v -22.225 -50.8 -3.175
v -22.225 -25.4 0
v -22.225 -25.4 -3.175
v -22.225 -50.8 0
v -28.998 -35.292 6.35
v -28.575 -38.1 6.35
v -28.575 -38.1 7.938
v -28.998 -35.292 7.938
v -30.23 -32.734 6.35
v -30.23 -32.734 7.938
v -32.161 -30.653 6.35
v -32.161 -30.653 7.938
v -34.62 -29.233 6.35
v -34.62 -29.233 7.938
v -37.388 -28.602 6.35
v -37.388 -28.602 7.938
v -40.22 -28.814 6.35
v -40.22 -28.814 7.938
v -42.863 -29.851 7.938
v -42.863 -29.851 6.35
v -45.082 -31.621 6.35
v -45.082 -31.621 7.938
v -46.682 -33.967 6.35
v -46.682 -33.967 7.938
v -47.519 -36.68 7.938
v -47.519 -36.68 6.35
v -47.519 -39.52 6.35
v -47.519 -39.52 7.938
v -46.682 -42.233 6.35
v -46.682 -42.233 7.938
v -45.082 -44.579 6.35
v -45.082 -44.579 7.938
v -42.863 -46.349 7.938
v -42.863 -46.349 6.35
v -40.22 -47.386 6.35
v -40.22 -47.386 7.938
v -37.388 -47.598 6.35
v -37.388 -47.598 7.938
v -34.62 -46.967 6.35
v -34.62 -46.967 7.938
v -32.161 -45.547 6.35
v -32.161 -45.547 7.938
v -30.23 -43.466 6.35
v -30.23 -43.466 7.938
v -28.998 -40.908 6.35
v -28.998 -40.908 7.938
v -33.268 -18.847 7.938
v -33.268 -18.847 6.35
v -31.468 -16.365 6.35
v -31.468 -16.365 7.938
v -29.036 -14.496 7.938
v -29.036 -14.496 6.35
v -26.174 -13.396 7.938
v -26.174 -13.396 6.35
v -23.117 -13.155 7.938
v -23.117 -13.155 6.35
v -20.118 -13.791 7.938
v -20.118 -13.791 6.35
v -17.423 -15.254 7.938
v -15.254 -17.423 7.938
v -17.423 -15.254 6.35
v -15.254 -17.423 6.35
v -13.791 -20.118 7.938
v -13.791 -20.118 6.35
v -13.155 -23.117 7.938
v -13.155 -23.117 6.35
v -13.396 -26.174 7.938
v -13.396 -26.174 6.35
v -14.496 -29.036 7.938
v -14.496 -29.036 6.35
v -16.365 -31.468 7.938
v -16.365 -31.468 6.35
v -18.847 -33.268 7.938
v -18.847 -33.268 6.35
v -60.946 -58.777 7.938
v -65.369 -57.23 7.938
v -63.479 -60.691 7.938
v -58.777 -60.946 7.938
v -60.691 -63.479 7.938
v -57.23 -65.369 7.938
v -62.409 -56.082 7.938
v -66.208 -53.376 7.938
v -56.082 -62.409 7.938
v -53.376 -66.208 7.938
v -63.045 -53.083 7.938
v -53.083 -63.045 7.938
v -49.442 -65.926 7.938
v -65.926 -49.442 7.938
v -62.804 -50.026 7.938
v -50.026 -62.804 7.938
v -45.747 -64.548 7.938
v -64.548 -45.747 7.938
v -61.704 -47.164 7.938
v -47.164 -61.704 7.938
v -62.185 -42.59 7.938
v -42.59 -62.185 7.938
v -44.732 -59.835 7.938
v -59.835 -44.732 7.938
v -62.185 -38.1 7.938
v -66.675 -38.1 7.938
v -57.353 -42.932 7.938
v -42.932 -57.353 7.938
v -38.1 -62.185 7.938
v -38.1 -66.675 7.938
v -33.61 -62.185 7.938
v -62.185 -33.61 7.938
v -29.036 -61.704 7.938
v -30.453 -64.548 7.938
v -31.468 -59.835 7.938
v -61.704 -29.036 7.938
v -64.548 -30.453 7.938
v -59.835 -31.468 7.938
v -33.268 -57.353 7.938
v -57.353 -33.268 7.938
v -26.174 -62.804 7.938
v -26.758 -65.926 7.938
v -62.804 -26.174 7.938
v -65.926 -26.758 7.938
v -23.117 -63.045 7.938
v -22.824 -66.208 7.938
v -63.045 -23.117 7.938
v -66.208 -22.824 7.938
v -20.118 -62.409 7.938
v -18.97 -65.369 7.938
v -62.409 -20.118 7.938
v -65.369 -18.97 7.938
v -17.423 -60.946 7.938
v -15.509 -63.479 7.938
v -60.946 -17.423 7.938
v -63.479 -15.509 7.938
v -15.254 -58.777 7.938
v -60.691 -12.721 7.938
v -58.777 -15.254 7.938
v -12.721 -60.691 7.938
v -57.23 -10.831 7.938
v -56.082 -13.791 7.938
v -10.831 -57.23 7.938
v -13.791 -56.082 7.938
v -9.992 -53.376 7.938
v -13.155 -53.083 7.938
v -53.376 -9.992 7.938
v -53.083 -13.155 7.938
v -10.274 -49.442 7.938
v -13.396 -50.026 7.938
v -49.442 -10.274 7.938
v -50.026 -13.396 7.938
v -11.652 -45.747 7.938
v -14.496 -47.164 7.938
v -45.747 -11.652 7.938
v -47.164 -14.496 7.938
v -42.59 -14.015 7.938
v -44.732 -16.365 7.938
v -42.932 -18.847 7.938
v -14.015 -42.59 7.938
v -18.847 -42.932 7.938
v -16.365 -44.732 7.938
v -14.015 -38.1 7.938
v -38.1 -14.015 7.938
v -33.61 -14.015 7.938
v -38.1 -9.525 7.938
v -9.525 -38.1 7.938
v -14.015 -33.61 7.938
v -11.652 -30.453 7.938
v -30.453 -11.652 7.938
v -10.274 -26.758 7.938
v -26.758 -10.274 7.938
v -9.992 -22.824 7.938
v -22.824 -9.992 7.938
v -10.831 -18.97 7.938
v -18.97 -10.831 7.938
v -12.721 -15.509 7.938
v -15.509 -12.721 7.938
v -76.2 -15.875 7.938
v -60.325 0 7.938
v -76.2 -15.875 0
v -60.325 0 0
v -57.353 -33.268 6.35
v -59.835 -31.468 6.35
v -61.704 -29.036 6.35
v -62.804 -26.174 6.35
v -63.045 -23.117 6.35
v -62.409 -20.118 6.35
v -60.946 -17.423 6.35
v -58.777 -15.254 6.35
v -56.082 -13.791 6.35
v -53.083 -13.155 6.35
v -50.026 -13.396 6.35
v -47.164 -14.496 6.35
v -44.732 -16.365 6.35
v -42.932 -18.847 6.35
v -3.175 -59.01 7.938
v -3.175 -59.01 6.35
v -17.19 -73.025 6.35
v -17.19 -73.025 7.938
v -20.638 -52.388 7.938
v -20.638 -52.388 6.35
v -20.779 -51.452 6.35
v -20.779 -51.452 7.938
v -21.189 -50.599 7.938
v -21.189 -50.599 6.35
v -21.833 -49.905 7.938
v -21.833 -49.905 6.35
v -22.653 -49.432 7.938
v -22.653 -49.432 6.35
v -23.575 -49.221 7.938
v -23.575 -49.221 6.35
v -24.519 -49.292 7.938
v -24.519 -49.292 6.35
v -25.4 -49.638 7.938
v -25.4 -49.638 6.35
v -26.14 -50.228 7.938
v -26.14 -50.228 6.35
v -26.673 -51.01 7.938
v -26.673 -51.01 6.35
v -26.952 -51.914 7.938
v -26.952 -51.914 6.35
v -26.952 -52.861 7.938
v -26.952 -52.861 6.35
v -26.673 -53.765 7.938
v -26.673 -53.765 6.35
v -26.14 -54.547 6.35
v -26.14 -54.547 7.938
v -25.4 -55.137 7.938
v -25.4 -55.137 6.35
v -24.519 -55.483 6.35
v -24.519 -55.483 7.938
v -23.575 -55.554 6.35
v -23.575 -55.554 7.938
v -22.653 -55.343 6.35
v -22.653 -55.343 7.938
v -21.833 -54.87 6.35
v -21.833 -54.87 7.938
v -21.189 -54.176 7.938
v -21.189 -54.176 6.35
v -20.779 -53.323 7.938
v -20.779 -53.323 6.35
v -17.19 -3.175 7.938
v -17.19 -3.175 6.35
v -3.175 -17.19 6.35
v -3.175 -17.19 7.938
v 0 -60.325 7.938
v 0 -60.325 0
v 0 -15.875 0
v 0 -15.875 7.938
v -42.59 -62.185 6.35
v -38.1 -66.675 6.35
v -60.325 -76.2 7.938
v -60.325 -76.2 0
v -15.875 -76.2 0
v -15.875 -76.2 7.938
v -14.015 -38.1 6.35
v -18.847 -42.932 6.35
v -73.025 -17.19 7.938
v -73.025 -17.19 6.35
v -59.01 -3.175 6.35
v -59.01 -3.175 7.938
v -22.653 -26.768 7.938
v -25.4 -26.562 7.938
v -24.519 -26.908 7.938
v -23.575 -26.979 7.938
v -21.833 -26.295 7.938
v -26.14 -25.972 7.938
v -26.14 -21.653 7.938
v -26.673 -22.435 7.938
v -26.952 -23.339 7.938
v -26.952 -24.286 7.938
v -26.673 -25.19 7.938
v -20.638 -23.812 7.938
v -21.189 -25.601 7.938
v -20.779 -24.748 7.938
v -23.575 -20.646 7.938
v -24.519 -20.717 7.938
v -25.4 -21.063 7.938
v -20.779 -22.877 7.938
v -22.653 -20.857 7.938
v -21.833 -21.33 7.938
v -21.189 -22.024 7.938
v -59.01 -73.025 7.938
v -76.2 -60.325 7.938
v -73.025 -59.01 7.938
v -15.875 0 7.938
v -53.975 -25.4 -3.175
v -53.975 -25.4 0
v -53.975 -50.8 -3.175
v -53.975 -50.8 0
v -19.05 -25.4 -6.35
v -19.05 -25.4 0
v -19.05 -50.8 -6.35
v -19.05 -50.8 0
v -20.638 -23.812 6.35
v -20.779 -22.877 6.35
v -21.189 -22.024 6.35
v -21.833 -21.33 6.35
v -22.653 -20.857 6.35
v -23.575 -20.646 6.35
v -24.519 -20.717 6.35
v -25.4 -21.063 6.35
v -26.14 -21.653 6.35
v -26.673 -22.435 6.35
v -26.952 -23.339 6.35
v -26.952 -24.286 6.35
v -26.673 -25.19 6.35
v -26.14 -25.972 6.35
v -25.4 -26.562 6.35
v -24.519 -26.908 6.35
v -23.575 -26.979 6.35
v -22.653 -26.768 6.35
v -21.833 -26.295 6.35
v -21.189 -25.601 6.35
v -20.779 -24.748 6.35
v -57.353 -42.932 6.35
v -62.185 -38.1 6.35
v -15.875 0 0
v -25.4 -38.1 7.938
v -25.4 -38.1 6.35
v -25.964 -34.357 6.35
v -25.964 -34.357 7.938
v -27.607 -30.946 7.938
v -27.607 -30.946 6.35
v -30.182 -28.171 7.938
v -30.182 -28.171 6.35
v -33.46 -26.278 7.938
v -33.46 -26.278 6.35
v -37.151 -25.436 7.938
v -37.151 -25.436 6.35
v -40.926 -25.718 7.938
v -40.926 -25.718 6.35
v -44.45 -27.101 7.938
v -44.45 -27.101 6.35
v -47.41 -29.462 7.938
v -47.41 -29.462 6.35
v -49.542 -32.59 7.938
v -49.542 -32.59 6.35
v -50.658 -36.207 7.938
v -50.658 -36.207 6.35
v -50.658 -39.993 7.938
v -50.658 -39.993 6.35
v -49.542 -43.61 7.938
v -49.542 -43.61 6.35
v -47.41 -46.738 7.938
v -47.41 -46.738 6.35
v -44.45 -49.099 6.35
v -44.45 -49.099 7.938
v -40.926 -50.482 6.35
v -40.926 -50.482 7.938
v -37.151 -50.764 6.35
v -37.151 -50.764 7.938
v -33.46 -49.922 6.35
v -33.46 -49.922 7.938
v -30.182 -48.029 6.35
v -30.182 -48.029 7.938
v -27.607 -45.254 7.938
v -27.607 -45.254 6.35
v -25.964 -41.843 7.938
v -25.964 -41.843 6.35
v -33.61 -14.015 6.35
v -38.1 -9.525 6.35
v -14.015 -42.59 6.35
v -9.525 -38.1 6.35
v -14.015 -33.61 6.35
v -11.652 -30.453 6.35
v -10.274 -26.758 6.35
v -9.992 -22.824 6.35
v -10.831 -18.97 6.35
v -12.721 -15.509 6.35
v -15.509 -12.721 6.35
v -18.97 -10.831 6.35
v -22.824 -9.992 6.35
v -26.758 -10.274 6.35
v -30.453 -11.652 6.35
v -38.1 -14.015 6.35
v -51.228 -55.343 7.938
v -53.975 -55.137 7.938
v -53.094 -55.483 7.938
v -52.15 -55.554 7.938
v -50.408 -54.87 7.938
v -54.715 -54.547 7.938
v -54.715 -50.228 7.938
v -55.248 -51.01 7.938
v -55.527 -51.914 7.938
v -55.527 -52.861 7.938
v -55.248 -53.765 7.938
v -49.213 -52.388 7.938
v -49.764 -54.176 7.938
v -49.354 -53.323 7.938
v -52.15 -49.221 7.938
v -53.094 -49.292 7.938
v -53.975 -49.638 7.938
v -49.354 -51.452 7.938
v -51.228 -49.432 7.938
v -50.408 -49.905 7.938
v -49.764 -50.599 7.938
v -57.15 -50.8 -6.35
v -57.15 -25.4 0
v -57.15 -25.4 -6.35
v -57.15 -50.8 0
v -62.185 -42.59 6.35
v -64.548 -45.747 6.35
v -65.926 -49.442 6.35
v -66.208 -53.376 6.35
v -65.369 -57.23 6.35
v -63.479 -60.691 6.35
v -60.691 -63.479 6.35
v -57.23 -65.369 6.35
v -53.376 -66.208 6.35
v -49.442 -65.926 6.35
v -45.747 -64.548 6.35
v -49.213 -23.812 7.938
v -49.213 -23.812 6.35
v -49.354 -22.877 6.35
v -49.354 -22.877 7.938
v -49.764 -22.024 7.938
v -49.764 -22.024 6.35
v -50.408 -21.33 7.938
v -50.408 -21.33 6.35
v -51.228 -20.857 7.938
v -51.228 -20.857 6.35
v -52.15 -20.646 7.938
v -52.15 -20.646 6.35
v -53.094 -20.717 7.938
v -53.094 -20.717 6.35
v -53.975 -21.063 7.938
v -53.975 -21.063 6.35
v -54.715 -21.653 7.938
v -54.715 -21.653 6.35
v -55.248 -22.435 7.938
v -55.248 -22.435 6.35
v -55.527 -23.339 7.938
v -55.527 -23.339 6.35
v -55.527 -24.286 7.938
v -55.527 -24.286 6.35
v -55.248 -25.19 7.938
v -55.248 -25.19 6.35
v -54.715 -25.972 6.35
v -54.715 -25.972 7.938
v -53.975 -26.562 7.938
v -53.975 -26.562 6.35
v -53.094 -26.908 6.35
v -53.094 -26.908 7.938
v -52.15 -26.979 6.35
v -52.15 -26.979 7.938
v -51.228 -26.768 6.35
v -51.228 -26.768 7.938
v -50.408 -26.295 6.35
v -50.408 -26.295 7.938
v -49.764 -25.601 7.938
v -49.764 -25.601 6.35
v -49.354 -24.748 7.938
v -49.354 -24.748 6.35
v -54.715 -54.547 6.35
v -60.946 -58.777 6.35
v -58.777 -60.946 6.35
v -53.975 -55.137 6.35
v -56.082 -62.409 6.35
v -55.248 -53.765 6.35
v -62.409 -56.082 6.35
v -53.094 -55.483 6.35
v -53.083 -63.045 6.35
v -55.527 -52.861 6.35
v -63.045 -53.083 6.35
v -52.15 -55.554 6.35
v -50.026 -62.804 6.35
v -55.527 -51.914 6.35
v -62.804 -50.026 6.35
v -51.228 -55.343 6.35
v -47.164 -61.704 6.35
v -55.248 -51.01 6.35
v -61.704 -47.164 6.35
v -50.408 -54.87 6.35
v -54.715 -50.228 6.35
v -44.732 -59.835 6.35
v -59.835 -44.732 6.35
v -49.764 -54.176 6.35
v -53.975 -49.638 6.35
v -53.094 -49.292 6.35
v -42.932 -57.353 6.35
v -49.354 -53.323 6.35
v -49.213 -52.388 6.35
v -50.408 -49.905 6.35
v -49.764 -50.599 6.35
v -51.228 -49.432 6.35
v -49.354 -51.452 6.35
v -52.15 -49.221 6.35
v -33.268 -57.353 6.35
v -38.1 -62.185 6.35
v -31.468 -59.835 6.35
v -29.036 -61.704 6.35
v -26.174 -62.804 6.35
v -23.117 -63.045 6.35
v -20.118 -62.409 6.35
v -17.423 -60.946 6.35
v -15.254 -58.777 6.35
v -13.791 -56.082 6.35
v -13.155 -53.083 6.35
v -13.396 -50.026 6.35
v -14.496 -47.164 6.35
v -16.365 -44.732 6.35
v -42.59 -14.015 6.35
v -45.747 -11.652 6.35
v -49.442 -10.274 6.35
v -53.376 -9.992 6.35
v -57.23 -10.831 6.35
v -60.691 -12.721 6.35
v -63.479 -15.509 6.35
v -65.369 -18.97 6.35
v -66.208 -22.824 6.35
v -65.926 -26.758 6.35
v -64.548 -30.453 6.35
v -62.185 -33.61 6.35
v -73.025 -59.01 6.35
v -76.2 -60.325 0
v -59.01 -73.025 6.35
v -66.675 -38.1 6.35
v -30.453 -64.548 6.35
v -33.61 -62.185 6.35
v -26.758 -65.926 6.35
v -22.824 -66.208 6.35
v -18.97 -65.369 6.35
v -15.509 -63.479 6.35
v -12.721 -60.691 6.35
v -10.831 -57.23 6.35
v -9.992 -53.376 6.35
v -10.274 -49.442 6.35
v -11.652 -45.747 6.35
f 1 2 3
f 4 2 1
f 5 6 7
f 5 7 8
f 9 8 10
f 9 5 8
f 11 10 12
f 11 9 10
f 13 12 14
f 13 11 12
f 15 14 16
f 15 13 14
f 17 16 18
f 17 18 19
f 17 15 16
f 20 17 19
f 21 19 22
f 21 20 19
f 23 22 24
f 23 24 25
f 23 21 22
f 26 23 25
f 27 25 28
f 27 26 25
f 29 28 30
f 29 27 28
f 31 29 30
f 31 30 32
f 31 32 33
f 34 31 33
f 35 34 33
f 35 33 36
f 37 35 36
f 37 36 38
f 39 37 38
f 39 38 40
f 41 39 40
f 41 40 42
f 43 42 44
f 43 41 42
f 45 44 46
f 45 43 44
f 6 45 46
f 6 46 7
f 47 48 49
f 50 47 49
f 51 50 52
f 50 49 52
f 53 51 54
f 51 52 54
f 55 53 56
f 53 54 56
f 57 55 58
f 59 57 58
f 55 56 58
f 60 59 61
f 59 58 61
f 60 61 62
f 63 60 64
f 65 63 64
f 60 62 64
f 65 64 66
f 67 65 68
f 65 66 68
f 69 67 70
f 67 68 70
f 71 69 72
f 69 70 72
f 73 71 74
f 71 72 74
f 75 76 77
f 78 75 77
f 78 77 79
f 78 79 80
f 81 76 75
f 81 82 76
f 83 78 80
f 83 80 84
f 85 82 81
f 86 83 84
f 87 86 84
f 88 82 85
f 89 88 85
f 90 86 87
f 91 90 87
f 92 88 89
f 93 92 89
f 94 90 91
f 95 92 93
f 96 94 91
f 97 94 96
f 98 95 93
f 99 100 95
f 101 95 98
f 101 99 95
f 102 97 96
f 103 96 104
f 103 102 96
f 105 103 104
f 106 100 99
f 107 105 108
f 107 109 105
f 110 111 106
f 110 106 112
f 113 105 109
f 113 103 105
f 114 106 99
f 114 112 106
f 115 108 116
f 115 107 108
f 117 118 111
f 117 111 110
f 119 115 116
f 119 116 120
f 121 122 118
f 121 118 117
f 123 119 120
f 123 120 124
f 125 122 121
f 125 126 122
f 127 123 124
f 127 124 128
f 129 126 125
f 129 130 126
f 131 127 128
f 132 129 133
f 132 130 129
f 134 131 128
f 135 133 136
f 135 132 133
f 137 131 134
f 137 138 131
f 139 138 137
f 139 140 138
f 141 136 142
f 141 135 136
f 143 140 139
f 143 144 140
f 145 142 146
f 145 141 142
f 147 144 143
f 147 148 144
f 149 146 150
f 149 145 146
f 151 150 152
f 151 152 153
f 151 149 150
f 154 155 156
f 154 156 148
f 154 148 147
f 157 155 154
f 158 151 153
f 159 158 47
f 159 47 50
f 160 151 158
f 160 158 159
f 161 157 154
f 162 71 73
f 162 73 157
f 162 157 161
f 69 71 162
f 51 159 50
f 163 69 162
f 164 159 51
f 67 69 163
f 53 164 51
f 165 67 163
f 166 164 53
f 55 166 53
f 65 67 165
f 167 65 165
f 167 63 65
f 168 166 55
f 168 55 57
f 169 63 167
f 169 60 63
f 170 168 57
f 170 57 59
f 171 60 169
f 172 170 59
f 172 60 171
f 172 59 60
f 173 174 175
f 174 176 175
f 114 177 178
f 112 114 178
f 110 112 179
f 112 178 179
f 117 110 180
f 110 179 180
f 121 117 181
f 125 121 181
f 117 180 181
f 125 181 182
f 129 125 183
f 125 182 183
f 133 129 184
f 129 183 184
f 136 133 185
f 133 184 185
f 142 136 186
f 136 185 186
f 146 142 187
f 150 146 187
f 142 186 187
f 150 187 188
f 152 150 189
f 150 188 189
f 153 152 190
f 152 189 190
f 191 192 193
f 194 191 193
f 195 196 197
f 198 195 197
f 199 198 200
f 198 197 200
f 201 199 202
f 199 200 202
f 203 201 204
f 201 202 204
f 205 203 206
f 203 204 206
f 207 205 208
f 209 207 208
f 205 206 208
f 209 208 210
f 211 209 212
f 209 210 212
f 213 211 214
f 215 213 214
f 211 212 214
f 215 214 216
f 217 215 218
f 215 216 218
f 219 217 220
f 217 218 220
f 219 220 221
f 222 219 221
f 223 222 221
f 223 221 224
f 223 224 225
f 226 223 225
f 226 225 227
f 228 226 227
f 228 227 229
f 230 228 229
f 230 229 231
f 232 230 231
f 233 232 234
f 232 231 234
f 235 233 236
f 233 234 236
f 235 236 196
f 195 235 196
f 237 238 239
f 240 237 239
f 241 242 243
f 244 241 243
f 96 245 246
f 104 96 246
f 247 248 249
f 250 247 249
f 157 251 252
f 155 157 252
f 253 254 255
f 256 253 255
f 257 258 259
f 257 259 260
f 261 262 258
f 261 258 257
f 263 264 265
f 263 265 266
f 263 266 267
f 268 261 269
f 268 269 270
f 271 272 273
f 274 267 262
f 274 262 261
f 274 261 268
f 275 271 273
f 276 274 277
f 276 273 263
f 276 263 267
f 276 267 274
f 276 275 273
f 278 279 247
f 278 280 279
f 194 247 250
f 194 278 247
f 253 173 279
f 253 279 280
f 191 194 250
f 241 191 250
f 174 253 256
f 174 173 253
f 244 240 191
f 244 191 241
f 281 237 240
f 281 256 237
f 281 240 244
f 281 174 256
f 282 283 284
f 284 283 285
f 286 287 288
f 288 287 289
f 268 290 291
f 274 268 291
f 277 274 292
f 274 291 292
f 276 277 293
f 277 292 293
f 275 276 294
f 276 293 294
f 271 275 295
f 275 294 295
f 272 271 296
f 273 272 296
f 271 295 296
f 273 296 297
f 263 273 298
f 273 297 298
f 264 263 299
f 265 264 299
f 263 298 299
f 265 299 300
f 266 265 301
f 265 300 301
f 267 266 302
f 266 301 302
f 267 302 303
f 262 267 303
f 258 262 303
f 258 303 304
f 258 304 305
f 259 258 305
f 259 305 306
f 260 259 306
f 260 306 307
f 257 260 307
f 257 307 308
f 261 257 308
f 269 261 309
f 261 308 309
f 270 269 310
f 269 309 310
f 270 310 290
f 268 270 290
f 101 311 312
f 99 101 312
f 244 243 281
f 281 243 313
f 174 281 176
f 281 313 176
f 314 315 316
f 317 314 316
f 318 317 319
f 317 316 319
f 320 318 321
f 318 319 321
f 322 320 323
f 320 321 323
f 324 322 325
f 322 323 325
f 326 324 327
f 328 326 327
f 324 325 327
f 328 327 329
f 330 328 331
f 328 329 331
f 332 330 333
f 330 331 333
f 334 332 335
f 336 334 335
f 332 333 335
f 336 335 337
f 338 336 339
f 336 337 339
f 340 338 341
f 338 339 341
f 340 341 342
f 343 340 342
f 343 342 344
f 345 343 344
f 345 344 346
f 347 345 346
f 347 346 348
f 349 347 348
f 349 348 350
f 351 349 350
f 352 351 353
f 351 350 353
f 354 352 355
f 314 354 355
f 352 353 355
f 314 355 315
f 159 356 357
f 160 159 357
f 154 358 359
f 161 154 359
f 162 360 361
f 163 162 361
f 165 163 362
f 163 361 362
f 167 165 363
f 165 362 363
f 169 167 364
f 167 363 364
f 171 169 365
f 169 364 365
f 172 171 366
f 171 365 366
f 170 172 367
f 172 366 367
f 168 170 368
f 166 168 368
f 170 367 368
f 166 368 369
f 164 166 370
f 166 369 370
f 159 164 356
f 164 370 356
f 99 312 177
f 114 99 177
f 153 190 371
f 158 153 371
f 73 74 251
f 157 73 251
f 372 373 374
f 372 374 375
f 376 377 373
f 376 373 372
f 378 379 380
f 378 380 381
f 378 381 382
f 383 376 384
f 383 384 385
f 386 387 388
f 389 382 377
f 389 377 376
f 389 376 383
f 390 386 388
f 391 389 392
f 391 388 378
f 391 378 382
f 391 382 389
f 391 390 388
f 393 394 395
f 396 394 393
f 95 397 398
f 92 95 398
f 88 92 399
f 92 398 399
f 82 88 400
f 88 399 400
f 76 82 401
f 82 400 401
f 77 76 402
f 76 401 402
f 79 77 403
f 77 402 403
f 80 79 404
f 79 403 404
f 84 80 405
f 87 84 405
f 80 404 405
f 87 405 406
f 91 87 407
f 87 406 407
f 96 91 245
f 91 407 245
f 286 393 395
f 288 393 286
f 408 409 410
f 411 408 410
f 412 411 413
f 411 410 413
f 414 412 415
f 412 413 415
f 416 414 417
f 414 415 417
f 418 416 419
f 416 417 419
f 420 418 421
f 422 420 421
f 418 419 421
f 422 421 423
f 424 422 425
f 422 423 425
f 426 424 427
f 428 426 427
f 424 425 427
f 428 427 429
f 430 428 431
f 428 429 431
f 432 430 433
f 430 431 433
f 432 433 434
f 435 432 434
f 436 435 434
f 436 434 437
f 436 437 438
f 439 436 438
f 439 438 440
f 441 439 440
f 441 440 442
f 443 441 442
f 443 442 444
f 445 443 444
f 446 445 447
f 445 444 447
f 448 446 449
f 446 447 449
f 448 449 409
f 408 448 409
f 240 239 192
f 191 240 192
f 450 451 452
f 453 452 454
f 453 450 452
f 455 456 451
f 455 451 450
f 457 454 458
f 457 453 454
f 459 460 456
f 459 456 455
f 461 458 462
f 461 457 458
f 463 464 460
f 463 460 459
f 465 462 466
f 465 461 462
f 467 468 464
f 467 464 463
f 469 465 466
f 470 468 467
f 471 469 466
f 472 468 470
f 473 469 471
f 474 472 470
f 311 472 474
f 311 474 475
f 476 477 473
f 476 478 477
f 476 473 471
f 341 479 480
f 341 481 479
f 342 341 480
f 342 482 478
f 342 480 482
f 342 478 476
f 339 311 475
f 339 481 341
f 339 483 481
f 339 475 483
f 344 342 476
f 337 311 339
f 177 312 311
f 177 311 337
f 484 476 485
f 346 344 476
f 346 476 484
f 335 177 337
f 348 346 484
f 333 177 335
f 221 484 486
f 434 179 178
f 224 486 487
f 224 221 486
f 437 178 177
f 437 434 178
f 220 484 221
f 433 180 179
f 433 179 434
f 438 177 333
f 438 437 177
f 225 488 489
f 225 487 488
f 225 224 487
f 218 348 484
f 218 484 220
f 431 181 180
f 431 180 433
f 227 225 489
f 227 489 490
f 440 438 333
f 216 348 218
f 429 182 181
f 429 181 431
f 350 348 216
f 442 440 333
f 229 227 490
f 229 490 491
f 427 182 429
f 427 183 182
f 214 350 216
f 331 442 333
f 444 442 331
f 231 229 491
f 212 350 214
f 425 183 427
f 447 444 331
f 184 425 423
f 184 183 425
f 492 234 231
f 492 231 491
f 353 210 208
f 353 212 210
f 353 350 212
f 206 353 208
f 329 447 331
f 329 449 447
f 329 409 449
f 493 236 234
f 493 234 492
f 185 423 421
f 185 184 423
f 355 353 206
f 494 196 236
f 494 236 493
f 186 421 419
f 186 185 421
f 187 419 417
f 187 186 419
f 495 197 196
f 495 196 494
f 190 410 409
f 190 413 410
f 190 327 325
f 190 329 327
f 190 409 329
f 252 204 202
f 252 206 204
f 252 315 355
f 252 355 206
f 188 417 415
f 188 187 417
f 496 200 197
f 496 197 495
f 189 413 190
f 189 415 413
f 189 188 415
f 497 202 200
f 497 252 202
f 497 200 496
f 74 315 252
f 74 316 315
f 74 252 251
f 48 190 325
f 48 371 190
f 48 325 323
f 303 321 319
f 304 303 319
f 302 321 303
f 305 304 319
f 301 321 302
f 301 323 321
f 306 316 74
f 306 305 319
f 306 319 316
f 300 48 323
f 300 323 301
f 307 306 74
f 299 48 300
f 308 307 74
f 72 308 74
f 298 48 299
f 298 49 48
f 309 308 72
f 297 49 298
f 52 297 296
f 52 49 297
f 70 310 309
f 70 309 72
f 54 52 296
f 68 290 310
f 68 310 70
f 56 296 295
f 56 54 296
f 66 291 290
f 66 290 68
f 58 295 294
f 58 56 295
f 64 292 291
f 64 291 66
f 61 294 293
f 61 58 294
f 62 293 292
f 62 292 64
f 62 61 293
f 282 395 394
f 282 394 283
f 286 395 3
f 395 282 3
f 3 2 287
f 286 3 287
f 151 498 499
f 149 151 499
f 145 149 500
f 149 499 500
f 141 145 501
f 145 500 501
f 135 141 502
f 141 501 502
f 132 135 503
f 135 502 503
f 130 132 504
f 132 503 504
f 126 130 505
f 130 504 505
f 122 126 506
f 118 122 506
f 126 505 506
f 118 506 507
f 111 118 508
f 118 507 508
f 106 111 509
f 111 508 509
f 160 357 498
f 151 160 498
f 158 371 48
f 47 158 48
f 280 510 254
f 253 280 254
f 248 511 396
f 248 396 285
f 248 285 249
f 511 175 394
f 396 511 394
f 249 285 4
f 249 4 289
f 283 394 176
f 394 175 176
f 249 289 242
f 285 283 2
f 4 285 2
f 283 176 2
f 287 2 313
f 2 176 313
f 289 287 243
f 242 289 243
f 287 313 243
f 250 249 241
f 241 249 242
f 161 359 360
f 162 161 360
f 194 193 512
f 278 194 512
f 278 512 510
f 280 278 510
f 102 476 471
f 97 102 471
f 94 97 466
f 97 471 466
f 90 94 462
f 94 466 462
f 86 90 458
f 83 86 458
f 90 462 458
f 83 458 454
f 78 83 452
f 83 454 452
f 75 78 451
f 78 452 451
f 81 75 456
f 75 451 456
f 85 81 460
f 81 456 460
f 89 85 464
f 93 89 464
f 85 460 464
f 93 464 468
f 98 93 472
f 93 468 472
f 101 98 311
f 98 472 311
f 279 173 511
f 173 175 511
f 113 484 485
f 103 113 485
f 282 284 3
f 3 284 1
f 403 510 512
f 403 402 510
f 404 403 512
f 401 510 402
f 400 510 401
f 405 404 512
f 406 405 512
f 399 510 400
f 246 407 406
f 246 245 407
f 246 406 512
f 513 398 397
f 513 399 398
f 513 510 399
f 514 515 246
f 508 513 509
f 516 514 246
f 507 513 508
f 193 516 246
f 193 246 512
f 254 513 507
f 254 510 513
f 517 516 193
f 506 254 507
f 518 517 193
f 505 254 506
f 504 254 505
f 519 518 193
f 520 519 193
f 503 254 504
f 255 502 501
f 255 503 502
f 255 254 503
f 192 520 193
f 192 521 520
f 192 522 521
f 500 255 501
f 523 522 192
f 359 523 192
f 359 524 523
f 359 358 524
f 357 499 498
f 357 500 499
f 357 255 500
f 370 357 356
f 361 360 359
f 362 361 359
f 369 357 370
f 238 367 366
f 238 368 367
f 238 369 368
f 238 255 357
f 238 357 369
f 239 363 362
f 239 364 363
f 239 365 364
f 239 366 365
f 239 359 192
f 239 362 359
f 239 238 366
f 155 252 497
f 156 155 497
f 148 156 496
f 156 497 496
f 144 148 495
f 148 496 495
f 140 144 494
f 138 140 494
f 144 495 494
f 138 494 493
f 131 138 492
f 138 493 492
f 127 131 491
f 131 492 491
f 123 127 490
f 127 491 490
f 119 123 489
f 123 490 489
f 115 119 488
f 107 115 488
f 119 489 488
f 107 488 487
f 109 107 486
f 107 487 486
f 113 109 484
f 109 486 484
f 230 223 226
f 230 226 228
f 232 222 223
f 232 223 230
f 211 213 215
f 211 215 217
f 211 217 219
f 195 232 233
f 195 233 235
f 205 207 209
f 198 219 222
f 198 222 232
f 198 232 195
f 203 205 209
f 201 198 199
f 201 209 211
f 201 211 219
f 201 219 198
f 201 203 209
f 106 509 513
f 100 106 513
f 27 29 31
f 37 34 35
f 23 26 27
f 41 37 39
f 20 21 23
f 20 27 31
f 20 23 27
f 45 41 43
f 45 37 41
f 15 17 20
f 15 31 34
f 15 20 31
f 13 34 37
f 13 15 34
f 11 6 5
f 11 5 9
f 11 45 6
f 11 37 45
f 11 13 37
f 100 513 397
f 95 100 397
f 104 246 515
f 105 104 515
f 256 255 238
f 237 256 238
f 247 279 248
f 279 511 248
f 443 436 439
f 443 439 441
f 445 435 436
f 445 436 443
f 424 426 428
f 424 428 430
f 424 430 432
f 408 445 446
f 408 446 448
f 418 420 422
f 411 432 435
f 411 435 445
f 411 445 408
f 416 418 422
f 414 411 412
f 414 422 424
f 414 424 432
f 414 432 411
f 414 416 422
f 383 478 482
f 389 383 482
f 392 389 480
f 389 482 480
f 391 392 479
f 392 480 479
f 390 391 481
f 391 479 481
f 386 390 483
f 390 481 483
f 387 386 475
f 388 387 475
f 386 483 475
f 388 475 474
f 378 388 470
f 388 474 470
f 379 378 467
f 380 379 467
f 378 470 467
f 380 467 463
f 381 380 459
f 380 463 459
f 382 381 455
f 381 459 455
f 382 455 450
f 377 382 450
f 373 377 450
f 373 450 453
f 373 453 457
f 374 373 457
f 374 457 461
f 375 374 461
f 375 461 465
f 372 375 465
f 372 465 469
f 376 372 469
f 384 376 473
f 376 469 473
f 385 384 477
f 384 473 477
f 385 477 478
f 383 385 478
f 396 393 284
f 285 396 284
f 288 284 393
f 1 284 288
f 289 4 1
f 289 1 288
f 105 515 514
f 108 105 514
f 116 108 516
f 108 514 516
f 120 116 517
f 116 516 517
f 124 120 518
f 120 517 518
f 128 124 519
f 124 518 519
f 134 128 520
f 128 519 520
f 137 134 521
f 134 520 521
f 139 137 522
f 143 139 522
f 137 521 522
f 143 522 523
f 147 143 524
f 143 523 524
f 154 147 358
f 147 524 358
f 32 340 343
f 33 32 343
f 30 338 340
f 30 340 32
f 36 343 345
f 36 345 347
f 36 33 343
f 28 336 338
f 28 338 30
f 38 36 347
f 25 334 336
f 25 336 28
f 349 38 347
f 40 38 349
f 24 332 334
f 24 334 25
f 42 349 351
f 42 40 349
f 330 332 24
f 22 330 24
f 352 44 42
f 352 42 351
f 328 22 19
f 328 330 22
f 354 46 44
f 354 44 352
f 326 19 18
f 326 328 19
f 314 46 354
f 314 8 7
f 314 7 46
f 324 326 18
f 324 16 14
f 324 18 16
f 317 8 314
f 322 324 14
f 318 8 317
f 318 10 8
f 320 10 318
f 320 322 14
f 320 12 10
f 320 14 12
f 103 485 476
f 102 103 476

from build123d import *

# Parameters (mm, degrees)
F1_DEPTH = 6.35
F2_R     = 12.7
F2_R_2   = 9.525
F2_R_3   = 3.175
F3_DEPTH = 1.5875
F4_W     = 3.175
F4_H     = 25.4
F5_DEPTH = 3.175
F6_W     = 38.1
F6_H     = 25.4
F7_DEPTH = 3.175


with BuildPart() as f1:
    # F0 (on Top) → F1 (new body)
    with BuildSketch(Plane.XY):
        Polygon((-15.875, 0), (-60.325, 0), (-76.2, -15.875), (-76.2, -60.325), (-60.325, -76.2), (-15.875, -76.2), (0, -60.325), (0, -15.875), align=None)
    extrude(amount=F1_DEPTH)

    # F2 (on face) → F3 (join)
    with BuildSketch(Plane.XY.offset(6.35)):
        Polygon((0, -15.875), (-15.875, 0), (-60.325, 0), (-76.2, -15.875), (-76.2, -60.325), (-60.325, -76.2), (-15.875, -76.2), (0, -60.325), align=None)
        Polygon((-3.175, -17.190128), (-3.175, -59.009872), (-17.190128, -73.025), (-59.009872, -73.025), (-73.025, -59.009872), (-73.025, -17.190128), (-59.009872, -3.175), (-17.190128, -3.175), align=None, mode=Mode.SUBTRACT)
        with BuildLine():
            Line((-38.1, -66.675), (-33.609872, -62.184872))
            ThreePointArc((-33.609872, -62.184872), (-14.015128, -62.184872), (-14.015128, -42.590128))
            Line((-14.015128, -42.590128), (-9.525, -38.1))
            Line((-9.525, -38.1), (-14.015128, -33.609872))
            ThreePointArc((-14.015128, -33.609872), (-14.015128, -14.015128), (-33.609872, -14.015128))
            Line((-33.609872, -14.015128), (-38.1, -9.525))
            Line((-38.1, -9.525), (-42.590128, -14.015128))
            ThreePointArc((-42.590128, -14.015128), (-62.184872, -14.015128), (-62.184872, -33.609872))
            Line((-62.184872, -33.609872), (-66.675, -38.1))
            Line((-66.675, -38.1), (-62.184872, -42.590128))
            ThreePointArc((-62.184872, -42.590128), (-62.184872, -62.184872), (-42.590128, -62.184872))
            Line((-42.590128, -62.184872), (-38.1, -66.675))
        make_face()
        with BuildLine():
            ThreePointArc((-33.268461, -18.846667), (-16.260192, -16.260192), (-18.846667, -33.268461))
            Line((-18.846667, -33.268461), (-14.015128, -38.1))
            Line((-14.015128, -38.1), (-18.846667, -42.931539))
            ThreePointArc((-18.846667, -42.931539), (-16.260192, -59.939808), (-33.268461, -57.353333))
            Line((-33.268461, -57.353333), (-38.1, -62.184872))
            Line((-38.1, -62.184872), (-42.931539, -57.353333))
            ThreePointArc((-42.931539, -57.353333), (-59.939808, -59.939808), (-57.353333, -42.931539))
            Line((-57.353333, -42.931539), (-62.184872, -38.1))
            Line((-62.184872, -38.1), (-57.353333, -33.268461))
            ThreePointArc((-57.353333, -33.268461), (-59.939808, -16.260192), (-42.931539, -18.846667))
            Line((-42.931539, -18.846667), (-38.1, -14.015128))
            Line((-38.1, -14.015128), (-33.268461, -18.846667))
        make_face(mode=Mode.SUBTRACT)
        with Locations((-38.1, -38.1)):
            Circle(F2_R)
        with Locations((-38.1, -38.1)):
            Circle(F2_R_2, mode=Mode.SUBTRACT)
        with Locations((-52.3875, -52.3875)):
            Circle(F2_R_3)
        with Locations((-23.8125, -52.3875)):
            Circle(F2_R_3)
        with Locations((-23.8125, -23.8125)):
            Circle(F2_R_3)
        with Locations((-52.3875, -23.8125)):
            Circle(F2_R_3)
    extrude(amount=F3_DEPTH)

    # F4 (on face) → F5 (join)
    with BuildSketch(Plane(origin=(0, 0, 0), x_dir=(1, 0, 0), z_dir=(0, 0, -1))):
        with Locations((-55.5625, 38.1)):
            Rectangle(F4_W, F4_H)
        with Locations((-20.6375, 38.1)):
            Rectangle(F4_W, F4_H)
    extrude(amount=F5_DEPTH)

    # F6 (on face) → F7 (join)
    with BuildSketch(Plane(origin=(0, 0, -3.175), x_dir=(1, 0, 0), z_dir=(0, 0, -1))):
        with Locations((-38.1, 38.1)):
            Rectangle(F6_W, F6_H)
    extrude(amount=F7_DEPTH)


solid = f1.part
